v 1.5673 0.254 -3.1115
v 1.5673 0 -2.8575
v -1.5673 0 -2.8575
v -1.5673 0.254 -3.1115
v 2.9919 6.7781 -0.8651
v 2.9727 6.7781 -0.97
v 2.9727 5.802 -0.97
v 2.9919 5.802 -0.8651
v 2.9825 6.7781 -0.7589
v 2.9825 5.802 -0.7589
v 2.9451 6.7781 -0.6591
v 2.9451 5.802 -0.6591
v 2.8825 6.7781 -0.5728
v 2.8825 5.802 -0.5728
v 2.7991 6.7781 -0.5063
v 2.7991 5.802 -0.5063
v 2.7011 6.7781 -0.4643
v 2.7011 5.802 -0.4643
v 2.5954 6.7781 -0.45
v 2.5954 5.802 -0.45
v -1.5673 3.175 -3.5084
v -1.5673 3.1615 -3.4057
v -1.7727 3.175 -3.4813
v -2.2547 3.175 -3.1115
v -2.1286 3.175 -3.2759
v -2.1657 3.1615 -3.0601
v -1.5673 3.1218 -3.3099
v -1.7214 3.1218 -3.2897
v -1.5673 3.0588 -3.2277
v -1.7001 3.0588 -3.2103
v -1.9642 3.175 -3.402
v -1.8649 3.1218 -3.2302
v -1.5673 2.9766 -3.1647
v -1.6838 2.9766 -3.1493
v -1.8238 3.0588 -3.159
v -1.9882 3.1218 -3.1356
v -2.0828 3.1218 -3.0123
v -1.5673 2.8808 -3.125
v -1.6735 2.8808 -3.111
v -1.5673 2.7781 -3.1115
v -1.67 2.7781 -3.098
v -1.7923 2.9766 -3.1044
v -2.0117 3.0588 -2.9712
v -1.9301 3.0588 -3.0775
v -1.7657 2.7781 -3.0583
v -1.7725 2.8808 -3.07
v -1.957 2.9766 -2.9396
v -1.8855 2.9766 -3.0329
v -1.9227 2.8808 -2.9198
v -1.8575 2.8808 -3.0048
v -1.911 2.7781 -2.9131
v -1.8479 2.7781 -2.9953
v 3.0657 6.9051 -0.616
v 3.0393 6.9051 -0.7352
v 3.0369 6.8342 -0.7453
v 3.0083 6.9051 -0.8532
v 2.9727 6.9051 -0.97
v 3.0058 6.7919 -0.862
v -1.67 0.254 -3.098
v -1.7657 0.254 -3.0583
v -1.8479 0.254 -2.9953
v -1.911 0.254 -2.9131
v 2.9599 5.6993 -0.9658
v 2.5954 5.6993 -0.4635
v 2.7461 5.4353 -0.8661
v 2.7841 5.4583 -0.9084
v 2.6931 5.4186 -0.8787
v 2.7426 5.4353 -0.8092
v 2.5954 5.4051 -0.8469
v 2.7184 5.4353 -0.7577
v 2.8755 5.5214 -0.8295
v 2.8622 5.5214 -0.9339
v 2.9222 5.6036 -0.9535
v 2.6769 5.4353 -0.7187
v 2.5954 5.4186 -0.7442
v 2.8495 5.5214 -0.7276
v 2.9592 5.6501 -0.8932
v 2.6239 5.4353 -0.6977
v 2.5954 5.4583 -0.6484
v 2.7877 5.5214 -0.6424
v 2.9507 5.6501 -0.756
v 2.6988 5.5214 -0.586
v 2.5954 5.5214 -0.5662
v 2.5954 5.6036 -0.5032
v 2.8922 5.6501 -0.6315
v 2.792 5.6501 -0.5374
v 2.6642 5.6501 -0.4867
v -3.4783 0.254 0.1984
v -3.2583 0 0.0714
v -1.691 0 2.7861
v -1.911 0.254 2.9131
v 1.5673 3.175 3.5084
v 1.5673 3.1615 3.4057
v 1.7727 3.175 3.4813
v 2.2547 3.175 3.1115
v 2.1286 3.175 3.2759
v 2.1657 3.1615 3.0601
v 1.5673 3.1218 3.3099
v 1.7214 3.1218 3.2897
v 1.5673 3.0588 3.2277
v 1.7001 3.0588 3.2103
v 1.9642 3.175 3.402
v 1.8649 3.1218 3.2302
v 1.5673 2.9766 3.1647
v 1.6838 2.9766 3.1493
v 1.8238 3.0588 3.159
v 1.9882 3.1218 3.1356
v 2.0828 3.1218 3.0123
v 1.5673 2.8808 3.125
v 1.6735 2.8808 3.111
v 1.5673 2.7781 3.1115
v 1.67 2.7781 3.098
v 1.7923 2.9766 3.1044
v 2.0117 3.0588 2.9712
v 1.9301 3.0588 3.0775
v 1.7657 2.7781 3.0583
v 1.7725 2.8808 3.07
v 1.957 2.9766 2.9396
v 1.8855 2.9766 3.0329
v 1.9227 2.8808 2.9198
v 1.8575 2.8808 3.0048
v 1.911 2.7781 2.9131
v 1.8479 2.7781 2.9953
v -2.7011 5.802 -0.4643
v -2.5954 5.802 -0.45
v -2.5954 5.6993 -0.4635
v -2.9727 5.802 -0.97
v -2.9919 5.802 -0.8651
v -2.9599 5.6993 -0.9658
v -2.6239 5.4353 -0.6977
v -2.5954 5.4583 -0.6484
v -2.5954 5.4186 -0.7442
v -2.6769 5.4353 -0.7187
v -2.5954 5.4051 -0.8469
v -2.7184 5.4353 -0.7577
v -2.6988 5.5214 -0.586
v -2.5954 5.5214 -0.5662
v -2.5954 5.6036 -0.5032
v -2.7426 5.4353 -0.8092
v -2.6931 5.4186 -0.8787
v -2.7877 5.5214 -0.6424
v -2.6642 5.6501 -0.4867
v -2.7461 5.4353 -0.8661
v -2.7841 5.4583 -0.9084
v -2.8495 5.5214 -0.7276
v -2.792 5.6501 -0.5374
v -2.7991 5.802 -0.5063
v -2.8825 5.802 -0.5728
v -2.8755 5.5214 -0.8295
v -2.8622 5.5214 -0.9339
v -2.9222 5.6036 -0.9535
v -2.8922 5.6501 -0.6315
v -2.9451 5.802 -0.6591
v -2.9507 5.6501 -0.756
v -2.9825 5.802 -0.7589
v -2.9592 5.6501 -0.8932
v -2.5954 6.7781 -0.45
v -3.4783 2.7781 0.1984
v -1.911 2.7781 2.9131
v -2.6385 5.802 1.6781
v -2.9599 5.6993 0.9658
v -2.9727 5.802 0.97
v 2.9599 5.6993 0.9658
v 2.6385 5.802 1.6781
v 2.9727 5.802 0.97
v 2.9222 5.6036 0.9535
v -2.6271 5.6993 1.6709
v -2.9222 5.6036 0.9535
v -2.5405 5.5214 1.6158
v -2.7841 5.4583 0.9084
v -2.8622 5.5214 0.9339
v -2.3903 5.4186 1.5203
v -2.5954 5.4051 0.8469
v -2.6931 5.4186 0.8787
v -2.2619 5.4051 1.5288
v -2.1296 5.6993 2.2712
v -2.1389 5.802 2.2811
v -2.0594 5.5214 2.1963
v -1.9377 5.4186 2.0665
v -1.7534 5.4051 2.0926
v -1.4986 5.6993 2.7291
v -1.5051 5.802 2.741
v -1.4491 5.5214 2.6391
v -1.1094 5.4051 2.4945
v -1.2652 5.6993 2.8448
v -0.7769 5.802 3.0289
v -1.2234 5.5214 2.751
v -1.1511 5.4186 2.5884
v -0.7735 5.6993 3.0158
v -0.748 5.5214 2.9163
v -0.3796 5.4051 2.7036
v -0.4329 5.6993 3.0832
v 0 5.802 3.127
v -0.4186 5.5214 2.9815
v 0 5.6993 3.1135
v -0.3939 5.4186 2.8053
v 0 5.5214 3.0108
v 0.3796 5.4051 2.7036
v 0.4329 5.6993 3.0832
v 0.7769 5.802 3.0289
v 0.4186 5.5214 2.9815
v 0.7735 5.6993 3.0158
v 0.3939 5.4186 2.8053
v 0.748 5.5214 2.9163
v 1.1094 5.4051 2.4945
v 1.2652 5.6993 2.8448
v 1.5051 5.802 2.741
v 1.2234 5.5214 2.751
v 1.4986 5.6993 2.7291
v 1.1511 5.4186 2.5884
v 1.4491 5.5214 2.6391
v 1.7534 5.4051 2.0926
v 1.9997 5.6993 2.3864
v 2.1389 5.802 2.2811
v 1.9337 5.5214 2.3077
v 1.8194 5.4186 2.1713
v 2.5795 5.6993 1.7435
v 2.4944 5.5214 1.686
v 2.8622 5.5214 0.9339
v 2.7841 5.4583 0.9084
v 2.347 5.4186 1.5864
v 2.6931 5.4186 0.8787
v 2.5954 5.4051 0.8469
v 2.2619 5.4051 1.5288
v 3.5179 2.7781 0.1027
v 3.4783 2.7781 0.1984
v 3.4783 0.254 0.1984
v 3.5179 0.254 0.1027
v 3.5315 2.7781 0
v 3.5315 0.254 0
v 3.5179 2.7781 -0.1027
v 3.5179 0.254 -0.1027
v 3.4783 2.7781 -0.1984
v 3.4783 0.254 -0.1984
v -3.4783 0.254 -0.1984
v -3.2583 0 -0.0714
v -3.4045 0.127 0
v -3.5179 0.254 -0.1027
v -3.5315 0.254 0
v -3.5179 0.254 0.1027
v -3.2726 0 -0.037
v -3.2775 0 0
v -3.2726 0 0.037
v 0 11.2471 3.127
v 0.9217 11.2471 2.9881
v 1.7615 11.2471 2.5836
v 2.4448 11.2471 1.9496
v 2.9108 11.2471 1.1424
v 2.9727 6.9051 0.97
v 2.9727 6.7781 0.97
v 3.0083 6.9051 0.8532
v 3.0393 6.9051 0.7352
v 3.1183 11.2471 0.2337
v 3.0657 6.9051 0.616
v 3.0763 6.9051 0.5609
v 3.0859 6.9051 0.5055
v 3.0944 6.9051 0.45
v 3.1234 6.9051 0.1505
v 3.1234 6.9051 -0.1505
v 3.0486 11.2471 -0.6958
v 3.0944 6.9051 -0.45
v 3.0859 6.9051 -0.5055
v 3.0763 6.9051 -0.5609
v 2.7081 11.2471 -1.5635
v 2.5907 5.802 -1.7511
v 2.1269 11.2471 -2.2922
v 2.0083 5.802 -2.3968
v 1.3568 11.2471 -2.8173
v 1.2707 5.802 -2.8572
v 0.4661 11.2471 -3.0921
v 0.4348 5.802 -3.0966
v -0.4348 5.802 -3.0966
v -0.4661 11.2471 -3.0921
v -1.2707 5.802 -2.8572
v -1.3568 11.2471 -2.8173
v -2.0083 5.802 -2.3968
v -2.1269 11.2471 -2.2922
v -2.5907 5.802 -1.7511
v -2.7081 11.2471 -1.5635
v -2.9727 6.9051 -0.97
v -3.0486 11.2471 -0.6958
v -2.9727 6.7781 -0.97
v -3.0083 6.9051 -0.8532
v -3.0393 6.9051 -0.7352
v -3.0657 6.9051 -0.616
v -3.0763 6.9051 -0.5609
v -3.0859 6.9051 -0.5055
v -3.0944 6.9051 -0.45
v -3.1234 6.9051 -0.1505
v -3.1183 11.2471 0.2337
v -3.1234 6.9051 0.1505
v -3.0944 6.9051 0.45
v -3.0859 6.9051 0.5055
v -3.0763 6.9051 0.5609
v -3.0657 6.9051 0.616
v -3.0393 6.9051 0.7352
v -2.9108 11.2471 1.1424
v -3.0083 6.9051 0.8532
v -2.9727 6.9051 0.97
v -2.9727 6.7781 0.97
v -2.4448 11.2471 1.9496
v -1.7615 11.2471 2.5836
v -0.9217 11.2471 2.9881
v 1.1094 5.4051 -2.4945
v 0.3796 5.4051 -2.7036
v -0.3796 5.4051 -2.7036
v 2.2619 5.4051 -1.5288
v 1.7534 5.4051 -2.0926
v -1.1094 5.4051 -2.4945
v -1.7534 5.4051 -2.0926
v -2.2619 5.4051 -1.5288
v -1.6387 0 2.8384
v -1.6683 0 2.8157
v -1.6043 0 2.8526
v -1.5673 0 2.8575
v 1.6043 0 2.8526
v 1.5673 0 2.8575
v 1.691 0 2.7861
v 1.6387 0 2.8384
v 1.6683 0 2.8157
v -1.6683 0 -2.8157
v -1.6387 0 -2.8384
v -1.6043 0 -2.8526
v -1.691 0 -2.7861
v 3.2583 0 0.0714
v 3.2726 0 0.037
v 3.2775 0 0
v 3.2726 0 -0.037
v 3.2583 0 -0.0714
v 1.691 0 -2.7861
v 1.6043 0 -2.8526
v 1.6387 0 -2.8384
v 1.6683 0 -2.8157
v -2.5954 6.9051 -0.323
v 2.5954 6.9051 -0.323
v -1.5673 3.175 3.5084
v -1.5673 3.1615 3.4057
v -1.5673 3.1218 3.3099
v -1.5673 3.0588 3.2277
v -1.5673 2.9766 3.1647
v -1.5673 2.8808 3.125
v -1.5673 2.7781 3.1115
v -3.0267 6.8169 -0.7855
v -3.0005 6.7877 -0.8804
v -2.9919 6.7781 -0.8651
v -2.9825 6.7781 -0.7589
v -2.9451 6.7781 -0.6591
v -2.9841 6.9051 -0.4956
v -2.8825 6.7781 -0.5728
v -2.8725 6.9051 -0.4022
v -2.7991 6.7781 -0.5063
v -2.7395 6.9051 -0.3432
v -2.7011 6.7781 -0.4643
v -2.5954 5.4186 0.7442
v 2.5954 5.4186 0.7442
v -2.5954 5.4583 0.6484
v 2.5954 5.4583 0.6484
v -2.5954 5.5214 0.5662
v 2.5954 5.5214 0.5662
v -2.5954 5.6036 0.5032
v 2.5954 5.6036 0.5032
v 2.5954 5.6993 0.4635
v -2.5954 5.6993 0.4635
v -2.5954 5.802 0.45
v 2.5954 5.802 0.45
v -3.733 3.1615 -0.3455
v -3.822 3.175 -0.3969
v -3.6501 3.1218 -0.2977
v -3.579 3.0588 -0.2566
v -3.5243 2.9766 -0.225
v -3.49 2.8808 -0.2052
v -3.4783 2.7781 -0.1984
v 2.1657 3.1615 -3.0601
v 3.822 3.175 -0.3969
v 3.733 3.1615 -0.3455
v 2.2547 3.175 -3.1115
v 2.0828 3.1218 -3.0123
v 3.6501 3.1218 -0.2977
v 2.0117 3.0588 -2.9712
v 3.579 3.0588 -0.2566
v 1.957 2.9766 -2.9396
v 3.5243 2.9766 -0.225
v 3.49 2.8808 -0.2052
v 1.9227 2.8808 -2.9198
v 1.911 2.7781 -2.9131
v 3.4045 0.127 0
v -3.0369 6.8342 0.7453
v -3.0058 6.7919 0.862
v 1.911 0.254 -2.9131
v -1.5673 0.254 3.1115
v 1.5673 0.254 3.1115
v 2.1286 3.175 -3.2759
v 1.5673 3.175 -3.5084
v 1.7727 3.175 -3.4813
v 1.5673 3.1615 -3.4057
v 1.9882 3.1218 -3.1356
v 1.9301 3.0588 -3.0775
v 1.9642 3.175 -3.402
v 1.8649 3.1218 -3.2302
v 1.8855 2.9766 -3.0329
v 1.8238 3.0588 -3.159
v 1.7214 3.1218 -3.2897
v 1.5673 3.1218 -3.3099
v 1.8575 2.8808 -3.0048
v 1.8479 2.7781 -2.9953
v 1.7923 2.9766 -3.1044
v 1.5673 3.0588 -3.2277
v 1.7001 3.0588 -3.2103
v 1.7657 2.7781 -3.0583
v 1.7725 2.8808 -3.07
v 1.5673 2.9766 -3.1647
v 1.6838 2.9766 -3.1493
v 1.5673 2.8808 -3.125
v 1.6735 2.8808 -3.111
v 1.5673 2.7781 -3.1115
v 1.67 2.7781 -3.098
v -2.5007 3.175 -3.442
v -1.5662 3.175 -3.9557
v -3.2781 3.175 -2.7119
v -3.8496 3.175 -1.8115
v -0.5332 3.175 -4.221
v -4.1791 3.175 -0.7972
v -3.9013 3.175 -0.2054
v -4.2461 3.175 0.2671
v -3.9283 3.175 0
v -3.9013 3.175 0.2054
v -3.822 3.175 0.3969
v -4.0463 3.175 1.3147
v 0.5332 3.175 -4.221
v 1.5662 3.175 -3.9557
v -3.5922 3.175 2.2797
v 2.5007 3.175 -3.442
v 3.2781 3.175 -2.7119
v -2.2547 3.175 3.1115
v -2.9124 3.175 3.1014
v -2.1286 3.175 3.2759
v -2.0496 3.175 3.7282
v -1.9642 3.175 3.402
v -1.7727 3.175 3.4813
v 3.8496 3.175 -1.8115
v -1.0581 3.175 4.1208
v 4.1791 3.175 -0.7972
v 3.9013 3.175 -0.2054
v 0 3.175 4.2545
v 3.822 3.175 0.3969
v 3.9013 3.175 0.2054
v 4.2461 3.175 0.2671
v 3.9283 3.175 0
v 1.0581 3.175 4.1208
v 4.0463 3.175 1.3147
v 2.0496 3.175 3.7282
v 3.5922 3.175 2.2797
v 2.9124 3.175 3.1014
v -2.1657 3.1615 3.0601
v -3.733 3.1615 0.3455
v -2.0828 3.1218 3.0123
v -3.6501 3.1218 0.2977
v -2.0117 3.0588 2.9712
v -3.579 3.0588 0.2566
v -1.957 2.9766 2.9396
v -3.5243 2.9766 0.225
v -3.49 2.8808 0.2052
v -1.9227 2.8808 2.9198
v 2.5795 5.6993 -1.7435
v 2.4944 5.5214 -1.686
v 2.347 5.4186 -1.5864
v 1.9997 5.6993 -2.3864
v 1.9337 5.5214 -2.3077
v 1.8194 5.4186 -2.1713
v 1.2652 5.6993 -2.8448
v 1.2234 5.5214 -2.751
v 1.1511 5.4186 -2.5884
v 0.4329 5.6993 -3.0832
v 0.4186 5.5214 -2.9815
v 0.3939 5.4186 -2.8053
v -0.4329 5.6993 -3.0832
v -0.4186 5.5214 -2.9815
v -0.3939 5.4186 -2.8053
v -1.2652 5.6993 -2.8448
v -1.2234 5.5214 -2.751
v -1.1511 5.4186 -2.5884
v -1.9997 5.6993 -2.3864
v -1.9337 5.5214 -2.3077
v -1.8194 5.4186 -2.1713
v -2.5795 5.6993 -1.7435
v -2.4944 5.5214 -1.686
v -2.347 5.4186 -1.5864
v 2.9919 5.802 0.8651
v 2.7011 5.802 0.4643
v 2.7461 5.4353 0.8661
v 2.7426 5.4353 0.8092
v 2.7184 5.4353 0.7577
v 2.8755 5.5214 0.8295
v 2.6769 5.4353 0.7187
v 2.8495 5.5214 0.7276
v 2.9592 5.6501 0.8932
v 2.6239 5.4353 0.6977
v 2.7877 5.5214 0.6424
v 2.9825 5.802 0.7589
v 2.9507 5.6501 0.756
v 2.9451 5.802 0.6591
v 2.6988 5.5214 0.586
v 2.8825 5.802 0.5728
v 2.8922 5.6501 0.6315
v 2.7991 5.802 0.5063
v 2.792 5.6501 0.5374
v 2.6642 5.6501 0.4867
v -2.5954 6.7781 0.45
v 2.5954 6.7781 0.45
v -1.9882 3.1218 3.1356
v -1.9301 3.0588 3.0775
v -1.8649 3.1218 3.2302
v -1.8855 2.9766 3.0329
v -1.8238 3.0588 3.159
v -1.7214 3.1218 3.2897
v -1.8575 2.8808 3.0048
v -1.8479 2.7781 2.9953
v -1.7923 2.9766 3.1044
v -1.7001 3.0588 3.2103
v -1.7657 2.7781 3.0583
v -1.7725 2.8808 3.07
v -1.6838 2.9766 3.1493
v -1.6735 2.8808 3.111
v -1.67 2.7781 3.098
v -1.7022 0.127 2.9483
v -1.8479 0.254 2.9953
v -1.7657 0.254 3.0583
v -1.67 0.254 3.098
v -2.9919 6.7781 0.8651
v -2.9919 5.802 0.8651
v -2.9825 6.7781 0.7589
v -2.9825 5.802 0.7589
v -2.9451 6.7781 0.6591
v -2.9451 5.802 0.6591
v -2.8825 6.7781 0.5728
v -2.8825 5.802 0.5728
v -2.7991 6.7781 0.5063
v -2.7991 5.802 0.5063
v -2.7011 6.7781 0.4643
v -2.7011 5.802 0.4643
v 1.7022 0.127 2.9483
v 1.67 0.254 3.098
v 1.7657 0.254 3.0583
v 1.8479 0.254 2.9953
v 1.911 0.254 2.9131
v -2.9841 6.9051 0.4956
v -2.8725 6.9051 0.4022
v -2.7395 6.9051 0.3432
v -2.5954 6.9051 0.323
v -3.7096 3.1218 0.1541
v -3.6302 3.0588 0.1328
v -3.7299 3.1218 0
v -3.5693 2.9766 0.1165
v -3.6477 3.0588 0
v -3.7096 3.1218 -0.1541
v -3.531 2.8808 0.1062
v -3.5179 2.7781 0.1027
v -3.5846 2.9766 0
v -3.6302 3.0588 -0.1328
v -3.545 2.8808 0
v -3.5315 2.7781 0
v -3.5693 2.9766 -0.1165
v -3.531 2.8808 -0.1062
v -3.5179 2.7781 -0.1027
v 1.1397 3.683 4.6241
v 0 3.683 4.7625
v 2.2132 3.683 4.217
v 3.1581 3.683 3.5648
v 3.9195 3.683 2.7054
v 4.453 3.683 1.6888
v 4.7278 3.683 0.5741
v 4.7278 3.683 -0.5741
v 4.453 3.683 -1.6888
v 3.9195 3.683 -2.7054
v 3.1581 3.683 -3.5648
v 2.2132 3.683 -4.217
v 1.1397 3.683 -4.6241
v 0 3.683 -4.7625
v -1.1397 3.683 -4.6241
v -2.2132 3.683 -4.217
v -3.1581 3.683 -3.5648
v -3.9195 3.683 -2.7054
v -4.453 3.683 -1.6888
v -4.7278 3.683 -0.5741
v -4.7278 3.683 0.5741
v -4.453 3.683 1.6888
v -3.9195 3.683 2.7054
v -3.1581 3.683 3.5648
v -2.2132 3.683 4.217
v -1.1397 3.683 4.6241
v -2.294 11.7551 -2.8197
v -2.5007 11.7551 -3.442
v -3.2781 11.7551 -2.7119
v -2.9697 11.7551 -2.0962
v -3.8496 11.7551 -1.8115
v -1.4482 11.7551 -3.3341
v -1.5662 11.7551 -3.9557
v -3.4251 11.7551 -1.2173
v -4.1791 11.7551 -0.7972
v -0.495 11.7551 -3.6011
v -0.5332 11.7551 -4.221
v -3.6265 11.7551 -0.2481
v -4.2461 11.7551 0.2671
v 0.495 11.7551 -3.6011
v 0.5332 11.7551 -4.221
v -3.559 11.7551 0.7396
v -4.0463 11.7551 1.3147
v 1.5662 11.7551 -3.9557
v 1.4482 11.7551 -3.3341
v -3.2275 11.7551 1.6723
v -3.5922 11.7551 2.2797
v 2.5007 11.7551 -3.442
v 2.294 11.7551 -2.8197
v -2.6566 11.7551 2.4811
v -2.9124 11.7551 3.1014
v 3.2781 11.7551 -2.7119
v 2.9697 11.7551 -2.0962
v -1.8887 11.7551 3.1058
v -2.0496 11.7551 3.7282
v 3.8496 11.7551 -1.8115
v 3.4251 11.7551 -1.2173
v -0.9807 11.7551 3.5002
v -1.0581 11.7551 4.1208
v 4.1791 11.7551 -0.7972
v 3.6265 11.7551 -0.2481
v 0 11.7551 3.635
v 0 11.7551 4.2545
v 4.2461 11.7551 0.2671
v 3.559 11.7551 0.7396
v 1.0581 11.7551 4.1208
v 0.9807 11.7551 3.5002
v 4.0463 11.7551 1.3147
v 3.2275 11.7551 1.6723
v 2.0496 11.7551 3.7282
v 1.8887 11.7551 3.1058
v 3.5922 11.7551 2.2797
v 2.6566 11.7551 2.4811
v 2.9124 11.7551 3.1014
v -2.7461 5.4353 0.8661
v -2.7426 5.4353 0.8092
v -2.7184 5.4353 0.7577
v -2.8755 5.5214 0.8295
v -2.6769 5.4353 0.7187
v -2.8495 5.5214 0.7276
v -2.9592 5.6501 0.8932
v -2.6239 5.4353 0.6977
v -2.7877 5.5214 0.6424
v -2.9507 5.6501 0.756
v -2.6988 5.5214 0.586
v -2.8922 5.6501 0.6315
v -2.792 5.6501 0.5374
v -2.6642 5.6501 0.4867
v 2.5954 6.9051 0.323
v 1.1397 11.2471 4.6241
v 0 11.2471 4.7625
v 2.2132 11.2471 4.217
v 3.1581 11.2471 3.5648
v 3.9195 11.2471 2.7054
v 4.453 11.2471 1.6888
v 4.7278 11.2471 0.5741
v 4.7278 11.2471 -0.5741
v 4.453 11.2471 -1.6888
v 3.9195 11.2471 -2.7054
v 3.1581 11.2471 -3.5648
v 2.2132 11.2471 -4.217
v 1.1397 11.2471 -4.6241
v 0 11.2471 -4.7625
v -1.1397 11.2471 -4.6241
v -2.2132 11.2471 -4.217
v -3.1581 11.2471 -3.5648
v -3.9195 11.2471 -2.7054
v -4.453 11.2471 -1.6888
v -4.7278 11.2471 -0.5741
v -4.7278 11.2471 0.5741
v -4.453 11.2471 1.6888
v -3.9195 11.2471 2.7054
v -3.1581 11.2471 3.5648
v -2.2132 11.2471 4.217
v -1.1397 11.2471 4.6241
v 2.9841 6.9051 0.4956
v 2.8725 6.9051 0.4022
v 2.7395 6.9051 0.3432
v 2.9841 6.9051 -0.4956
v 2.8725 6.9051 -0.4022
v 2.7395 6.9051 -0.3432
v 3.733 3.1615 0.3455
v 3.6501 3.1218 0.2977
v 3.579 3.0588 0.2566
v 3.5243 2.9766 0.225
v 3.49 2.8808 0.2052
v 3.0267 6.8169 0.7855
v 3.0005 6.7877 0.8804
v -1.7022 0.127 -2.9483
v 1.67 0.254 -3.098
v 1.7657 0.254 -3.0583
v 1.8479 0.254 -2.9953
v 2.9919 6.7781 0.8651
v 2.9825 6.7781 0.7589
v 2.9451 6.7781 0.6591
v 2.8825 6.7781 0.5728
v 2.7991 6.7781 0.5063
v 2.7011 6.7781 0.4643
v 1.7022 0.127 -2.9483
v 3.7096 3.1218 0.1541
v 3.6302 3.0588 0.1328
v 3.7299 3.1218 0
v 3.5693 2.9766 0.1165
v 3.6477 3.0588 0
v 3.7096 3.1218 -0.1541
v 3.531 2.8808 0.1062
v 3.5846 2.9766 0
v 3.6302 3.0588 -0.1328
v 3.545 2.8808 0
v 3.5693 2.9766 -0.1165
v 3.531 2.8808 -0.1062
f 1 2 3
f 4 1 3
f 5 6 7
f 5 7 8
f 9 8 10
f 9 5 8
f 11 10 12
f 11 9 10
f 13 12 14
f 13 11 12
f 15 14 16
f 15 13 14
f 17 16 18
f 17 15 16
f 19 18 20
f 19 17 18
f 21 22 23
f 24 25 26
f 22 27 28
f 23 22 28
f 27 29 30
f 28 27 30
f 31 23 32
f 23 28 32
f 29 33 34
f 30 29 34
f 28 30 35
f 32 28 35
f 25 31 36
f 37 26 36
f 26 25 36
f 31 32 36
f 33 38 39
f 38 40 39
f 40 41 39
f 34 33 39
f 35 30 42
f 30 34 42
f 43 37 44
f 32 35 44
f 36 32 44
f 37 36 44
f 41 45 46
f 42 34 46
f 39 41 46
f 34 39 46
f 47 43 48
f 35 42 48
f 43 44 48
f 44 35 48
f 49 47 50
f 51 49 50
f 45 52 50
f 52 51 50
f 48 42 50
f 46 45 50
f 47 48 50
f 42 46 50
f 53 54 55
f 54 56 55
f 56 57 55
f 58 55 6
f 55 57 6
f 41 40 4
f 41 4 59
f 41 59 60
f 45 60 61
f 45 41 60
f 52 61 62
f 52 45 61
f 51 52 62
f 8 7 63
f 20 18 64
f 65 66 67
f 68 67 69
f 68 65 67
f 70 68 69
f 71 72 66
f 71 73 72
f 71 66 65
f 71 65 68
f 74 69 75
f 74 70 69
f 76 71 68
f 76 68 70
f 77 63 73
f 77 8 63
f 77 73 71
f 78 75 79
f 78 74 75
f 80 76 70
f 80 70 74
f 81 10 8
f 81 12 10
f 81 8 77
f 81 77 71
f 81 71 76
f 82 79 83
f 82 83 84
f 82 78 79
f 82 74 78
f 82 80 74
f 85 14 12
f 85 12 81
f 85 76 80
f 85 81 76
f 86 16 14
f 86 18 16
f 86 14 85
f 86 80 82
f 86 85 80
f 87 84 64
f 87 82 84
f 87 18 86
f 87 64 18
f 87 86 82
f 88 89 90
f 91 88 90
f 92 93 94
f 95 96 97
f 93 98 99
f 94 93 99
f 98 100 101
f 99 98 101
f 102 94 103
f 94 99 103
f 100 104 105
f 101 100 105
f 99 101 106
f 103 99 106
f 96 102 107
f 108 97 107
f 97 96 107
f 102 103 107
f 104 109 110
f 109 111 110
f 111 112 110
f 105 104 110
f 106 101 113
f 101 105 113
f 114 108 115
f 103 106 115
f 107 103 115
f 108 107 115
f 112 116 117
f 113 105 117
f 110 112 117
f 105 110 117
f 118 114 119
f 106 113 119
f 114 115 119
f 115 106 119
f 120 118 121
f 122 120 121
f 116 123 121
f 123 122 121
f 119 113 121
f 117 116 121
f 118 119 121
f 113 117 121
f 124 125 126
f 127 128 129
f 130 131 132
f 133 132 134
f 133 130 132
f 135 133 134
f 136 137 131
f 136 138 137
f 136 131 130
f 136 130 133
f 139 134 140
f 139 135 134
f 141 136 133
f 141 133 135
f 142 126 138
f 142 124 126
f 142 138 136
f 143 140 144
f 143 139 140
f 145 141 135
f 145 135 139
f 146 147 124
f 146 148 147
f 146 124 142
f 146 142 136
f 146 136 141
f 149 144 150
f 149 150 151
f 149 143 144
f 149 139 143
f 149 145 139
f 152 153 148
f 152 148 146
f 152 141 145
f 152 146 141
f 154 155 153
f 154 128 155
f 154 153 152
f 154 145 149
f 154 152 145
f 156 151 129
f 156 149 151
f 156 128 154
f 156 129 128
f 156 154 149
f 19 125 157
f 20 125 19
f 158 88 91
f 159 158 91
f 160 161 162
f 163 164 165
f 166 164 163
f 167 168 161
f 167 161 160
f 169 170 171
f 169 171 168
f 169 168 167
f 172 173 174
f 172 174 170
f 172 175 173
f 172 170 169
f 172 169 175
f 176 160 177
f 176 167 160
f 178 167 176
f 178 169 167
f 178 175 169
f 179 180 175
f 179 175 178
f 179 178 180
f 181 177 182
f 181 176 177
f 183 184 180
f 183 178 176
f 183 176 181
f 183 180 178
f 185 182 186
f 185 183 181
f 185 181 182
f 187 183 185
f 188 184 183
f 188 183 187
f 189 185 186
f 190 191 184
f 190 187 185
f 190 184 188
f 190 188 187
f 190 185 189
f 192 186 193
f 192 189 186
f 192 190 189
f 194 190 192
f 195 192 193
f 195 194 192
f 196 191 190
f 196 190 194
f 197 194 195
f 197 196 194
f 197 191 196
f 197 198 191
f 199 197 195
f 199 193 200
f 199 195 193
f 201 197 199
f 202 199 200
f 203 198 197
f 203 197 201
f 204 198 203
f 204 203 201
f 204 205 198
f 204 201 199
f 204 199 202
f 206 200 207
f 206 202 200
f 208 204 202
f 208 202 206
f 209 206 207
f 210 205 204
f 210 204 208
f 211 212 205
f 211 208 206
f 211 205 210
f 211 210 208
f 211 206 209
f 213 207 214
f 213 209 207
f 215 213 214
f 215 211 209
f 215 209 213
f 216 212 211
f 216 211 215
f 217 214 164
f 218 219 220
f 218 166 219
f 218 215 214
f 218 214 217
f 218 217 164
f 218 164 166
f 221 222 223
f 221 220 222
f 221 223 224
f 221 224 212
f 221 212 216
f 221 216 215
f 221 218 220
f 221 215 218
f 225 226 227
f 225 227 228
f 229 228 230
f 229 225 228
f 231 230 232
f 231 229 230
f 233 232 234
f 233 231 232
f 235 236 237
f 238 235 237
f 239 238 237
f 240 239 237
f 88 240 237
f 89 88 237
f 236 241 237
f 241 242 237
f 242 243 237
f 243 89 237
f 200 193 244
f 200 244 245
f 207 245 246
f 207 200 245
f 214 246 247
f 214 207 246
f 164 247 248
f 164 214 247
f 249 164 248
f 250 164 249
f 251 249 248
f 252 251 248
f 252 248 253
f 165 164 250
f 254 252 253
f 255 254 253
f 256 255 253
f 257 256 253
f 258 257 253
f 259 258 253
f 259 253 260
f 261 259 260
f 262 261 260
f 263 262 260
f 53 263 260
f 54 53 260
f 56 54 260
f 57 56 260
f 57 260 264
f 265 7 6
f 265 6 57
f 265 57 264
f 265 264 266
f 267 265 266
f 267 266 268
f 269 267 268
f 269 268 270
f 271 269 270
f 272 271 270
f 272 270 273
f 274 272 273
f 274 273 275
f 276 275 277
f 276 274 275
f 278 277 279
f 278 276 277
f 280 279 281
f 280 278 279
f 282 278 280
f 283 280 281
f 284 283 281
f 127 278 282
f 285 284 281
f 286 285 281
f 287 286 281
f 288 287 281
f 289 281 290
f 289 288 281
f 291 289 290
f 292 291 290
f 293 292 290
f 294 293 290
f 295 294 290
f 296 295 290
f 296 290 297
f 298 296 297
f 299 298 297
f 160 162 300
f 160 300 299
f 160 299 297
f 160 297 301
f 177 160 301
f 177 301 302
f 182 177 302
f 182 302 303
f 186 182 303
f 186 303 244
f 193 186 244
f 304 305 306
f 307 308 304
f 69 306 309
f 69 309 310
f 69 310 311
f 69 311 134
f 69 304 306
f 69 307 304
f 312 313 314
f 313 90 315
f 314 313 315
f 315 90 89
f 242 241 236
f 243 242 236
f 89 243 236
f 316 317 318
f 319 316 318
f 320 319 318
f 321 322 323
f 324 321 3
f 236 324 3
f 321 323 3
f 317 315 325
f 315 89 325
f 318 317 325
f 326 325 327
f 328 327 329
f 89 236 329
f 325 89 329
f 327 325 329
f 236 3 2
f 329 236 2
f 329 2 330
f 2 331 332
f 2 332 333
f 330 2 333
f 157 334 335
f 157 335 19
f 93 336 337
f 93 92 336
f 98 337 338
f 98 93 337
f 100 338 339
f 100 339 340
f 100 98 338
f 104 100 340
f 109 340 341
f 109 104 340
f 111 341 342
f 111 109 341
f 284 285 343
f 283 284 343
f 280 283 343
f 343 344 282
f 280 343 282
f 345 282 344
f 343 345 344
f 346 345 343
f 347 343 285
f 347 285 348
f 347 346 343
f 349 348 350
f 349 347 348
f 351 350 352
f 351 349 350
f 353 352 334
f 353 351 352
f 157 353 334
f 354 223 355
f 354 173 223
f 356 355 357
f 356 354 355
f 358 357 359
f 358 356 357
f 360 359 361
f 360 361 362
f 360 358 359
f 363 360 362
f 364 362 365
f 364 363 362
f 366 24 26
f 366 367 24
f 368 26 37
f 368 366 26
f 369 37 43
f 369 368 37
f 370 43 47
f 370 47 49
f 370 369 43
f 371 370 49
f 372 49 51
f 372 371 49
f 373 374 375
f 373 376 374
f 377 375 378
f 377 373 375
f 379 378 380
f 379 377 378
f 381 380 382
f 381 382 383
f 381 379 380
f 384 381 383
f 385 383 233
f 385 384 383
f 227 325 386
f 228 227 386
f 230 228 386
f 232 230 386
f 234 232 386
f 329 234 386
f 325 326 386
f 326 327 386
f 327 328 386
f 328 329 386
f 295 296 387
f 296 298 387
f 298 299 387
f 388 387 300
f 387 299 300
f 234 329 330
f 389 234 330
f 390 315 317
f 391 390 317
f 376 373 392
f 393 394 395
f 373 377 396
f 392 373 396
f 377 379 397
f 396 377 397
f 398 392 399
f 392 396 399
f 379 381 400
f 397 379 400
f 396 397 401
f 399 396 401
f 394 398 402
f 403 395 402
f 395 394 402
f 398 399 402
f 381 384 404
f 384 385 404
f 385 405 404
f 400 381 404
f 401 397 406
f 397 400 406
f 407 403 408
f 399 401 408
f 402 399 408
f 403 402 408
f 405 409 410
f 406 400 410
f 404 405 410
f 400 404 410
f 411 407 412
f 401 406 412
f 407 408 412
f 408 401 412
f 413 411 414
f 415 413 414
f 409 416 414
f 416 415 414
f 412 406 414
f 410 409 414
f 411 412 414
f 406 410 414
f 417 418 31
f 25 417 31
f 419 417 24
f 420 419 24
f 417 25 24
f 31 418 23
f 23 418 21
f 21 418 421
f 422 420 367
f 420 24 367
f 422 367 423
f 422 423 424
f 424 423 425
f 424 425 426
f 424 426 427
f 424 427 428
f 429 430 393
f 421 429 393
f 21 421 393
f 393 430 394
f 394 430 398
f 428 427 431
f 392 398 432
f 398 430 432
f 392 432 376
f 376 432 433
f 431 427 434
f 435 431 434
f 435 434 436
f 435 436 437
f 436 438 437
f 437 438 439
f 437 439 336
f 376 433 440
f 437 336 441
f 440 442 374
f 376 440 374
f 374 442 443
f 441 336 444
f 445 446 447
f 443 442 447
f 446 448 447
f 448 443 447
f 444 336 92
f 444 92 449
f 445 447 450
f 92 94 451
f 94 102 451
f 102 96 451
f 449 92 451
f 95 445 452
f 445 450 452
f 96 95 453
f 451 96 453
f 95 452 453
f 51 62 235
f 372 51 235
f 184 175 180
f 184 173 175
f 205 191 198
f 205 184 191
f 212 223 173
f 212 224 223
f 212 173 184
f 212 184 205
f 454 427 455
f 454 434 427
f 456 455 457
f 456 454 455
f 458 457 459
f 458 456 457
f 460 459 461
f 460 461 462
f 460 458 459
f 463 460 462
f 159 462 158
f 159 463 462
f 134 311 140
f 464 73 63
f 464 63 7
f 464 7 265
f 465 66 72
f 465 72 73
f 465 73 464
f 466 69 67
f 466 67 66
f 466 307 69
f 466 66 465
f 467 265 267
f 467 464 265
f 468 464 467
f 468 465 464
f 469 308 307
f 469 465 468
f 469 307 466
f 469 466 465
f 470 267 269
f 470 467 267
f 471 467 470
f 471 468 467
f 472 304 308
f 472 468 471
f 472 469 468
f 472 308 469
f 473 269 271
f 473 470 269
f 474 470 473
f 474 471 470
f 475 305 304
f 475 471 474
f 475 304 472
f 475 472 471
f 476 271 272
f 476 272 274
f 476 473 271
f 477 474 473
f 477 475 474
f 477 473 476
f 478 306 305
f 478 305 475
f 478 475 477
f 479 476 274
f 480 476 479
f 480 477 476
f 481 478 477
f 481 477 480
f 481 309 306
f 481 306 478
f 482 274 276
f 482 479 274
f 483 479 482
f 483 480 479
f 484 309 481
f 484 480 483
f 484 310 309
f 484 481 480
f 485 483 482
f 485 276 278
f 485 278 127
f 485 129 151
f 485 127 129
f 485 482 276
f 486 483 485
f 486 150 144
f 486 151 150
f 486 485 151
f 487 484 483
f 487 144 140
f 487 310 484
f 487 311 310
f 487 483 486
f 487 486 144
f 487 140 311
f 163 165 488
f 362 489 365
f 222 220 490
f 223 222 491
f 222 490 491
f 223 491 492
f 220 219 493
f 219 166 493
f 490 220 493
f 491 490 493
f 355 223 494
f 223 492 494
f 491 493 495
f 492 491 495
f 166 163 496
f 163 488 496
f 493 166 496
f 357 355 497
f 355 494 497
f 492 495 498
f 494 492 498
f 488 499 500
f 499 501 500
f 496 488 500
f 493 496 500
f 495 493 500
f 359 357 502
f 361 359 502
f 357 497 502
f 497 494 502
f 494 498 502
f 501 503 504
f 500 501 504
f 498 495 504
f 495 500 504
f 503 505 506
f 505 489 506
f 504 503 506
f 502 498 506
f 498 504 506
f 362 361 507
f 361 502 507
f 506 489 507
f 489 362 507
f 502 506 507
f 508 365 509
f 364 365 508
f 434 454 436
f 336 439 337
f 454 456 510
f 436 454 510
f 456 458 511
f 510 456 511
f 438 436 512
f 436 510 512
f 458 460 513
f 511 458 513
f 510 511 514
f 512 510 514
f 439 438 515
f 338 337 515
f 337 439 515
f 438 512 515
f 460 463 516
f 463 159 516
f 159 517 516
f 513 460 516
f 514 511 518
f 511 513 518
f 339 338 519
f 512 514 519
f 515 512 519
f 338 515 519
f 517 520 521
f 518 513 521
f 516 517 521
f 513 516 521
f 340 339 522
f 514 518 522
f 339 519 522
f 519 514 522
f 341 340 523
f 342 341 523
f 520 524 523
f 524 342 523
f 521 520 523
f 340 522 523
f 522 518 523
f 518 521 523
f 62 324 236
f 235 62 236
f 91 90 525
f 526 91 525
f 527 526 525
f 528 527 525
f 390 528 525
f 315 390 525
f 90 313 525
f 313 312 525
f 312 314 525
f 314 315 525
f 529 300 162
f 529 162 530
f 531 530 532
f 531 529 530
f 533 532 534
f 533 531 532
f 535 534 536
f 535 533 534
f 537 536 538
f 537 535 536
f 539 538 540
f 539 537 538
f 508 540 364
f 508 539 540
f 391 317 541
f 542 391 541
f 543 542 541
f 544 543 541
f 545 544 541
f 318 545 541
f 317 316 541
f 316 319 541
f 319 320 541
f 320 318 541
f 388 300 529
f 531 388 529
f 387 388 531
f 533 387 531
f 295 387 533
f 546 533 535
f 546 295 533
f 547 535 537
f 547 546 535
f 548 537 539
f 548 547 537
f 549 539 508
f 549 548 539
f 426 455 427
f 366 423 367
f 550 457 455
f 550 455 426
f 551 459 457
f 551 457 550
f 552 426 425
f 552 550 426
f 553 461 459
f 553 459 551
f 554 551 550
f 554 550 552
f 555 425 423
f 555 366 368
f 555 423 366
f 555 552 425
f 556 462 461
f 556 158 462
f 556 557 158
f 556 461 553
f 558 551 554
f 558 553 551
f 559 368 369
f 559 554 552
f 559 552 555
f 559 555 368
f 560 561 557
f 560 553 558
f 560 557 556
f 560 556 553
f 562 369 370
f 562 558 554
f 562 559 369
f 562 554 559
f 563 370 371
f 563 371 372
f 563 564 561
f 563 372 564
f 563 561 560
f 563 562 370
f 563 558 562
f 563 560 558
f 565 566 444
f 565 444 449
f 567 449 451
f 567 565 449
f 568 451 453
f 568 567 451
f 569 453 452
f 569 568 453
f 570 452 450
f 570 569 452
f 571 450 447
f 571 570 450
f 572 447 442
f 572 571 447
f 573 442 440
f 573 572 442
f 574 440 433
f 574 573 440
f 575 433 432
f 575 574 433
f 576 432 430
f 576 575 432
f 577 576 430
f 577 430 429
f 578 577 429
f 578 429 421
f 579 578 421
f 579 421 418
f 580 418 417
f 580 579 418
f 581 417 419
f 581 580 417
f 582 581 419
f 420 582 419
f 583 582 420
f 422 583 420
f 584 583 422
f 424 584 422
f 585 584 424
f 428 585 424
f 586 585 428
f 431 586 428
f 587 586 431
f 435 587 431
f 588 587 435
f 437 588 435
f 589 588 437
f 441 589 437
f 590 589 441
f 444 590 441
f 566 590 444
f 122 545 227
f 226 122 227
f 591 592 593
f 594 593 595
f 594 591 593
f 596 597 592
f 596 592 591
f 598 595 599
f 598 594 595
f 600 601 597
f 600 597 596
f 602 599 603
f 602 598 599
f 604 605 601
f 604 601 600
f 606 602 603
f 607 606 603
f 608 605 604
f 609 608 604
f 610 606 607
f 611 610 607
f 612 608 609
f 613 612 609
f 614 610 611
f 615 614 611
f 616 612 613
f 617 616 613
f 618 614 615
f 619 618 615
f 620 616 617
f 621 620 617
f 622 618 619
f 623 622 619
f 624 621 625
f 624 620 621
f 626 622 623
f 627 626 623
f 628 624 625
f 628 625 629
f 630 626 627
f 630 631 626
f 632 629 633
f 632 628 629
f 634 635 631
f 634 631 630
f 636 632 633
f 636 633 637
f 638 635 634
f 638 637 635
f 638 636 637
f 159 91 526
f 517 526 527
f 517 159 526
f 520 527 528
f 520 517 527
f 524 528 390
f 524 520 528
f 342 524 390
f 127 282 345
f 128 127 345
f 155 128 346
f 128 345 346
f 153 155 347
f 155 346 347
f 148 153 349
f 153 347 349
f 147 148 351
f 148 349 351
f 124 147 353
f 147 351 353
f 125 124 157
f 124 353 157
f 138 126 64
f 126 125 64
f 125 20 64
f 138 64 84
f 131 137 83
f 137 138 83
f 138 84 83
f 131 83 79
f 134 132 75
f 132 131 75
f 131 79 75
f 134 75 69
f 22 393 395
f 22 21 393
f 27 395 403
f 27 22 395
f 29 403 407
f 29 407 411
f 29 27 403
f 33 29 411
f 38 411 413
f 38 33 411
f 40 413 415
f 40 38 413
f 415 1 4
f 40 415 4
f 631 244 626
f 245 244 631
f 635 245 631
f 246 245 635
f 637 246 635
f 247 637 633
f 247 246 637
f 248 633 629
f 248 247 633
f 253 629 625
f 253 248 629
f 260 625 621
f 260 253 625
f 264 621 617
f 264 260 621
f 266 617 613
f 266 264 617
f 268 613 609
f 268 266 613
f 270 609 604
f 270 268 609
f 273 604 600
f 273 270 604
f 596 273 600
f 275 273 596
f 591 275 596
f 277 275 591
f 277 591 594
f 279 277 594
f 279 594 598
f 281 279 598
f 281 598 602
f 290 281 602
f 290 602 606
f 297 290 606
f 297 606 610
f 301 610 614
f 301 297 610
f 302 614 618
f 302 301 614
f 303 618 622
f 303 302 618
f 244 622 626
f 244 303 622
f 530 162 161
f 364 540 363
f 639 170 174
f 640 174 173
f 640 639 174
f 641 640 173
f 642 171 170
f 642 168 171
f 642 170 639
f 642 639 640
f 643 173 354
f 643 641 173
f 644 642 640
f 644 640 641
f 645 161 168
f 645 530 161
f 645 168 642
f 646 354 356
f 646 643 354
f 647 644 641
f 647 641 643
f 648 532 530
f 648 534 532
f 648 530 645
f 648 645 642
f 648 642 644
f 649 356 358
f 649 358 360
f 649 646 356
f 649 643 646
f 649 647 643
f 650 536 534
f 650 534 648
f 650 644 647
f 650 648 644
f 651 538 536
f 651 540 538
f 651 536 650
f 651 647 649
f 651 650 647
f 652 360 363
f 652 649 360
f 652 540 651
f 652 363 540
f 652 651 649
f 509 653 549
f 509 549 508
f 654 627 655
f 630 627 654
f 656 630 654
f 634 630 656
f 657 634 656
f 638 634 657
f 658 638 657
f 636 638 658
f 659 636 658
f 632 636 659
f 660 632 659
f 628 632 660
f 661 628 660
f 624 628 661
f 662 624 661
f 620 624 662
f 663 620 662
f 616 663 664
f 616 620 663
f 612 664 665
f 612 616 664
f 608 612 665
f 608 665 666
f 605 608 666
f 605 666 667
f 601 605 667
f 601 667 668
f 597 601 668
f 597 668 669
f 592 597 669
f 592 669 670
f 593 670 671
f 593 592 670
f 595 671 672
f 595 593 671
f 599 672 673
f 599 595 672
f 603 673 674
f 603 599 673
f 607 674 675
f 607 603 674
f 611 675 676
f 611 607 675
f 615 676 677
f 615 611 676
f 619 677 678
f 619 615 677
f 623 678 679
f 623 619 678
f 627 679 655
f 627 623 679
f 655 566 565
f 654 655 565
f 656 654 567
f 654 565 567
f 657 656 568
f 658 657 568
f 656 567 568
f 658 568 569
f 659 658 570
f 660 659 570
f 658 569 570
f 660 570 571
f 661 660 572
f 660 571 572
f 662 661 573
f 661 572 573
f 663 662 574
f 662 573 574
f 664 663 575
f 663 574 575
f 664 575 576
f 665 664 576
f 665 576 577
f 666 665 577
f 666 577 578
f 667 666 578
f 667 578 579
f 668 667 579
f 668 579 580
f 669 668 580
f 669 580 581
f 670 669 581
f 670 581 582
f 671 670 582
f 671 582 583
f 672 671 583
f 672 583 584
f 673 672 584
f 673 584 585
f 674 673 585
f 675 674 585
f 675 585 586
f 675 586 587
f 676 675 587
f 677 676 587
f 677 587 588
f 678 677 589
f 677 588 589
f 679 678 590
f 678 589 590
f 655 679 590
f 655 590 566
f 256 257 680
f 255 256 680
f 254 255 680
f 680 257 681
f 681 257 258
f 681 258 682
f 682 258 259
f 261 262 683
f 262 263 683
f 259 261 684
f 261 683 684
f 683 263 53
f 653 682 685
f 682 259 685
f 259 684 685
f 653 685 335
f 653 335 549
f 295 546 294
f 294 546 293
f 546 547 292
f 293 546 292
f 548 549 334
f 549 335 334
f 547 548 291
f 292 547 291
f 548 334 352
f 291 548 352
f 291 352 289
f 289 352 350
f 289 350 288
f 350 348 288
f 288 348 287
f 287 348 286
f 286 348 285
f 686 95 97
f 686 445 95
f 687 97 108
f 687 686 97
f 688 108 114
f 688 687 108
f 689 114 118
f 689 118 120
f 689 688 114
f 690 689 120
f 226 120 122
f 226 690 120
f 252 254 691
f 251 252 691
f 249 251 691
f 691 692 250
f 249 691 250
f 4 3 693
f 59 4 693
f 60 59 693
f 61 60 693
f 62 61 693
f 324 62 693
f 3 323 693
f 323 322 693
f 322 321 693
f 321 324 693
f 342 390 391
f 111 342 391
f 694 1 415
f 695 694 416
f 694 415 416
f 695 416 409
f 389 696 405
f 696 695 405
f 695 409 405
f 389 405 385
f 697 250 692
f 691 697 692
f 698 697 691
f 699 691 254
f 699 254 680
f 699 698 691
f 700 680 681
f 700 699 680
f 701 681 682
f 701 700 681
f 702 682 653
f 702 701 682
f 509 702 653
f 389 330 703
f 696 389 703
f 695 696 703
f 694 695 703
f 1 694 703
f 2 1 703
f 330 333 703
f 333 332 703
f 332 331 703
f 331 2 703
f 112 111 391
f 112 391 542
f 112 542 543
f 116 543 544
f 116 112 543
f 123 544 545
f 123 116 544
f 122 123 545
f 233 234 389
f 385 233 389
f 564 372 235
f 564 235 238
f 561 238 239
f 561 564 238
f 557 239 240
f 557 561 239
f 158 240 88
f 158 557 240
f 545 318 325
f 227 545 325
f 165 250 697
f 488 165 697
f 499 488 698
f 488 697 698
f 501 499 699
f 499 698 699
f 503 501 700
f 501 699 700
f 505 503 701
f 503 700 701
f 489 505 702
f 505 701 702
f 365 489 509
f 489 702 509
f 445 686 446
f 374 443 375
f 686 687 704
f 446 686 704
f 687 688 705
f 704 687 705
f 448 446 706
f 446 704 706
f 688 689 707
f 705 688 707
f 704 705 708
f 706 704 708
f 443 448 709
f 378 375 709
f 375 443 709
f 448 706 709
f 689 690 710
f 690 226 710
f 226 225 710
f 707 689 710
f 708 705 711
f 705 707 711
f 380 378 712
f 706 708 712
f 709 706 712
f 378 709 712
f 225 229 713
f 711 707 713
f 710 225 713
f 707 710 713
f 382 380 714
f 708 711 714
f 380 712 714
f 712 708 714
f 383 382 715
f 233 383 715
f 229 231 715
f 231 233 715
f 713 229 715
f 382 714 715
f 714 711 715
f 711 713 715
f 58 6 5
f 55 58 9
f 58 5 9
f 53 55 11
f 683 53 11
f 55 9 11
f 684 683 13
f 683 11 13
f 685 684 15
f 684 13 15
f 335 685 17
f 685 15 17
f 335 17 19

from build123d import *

# Parameters (mm, degrees)
BOSS_EXTRUDE1_DEPTH = 3.175
SKETCH2_R           = 4.7625
BOSS_EXTRUDE2_DEPTH = 2.23012
SKETCH3_R           = 4.7625
SKETCH3_R_2         = 3.126994
BOSS_EXTRUDE3_DEPTH = 6.35
BOSS_EXTRUDE4_DEPTH = 1.5
FILLET1_1_64_R      = 0.396875
CHAMFER1_0_02_SIZE  = 0.508
CHAMFER2_0_005_SIZE = 0.127
CHAMFER3_0_01_SIZE  = 0.254


with BuildPart() as part:
    # Sketch1 → Boss-Extrude1 (new body)
    with BuildSketch(Plane(origin=(0, 0, 0), x_dir=(1, 0, 0), z_dir=(0, 1, 0))):
        Polygon((1.796425363, 3.1115), (-1.796425363, 3.1115), (-3.592850725, 0), (-1.796425363, -3.1115), (1.796425363, -3.1115), (3.592850725, 0), align=None)
    extrude(amount=BOSS_EXTRUDE1_DEPTH)

    # Sketch2 → Boss-Extrude2 (add)
    with BuildSketch(Plane(origin=(0, 3.175, 0), x_dir=(1, 0, 0), z_dir=(0, 1, 0))):
        with Locations(Location((0, 0, 0), (0, 0, 270))):
            Circle(SKETCH2_R)
    extrude(amount=BOSS_EXTRUDE2_DEPTH)

    # Sketch3 → Boss-Extrude3 (add)
    with BuildSketch(Plane(origin=(0, 5.40512, 0), x_dir=(1, 0, 0), z_dir=(0, 1, 0))):
        with Locations(Location((0, 0, 0), (0, 0, 270))):
            Circle(SKETCH3_R)
        with Locations(Location((0, 0, 0), (0, 0, 270))):
            Circle(SKETCH3_R_2, mode=Mode.SUBTRACT)
    extrude(amount=BOSS_EXTRUDE3_DEPTH)

    # Sketch4 → Boss-Extrude4 (add)
    with BuildSketch(Plane(origin=(0, 5.40512, 0), x_dir=(1, 0, 0), z_dir=(0, 1, 0))):
        with BuildLine():
            Line((-3.094445261, 0.45), (3.094445261, 0.45))
            ThreePointArc((3.094445261, 0.45), (3.126994, 0), (3.094445261, -0.45))
            Line((3.094445261, -0.45), (-3.094445261, -0.45))
            ThreePointArc((-3.094445261, -0.45), (-3.126994, 0), (-3.094445261, 0.45))
        make_face()
    extrude(amount=BOSS_EXTRUDE4_DEPTH)

    # Fillet1-1/64
    fillet1_1_64_edges = [part.edges().sort_by_distance(p)[0] for p in [
        (-2.694638044, 3.175, -1.55575),
        (3.592850725, 1.5875, 0),
        (1.796425363, 1.5875, 3.1115),
        (-1.796425363, 1.5875, 3.1115),
        (-3.592850725, 1.5875, 0),
        (-1.796425363, 1.5875, -3.1115),
        (1.796425363, 1.5875, -3.1115),
        (-2.694638044, 3.175, 1.55575),
        (0, 3.175, 3.1115),
        (2.694638044, 3.175, 1.55575),
        (0, 5.40512, -3.126994),
        (-2.045842635, 5.40512, 2.36487196),
        (-3.094445261, 6.15512, -0.45),
        (0, 5.40512, 0.45),
        (-3.094445261, 6.15512, 0.45),
        (3.094445261, 6.15512, 0.45),
        (0, 5.40512, -0.45),
        (3.094445261, 6.15512, -0.45),
        (2.694638044, 3.175, -1.55575),
        (0, 3.175, -3.1115),
    ]]
    fillet(fillet1_1_64_edges, radius=FILLET1_1_64_R)

    # Chamfer1-0.02
    chamfer1_0_02_edges = [part.edges().sort_by_distance(p)[0] for p in [
        (0, 3.175, -4.7625),
        (0, 11.75512, -4.7625),
        (0, 11.75512, -3.126994),
    ]]
    chamfer(chamfer1_0_02_edges, length=CHAMFER1_0_02_SIZE)

    # Chamfer2-0.005
    # the kernel refuses this chamfer: 0.127 mm, written as the material it takes off along each edge
    with BuildSketch(Plane(origin=(-2.595448418, 6.90512, -0.45), x_dir=(0, 0.027495876610587285, 0.9996219169112968), z_dir=(1, 0, 0)), Plane(origin=(2.595448418, 6.90512, 0.45), x_dir=(0, 0.027495876610587285, -0.9996219169112968), z_dir=(-1, 0, 0))) as chamfer2_0_005_piece_1:
        Polygon((CHAMFER2_0_005_SIZE * 0.999621916911, CHAMFER2_0_005_SIZE * 0.0274958766106), (-CHAMFER2_0_005_SIZE * 0.0274958766106, CHAMFER2_0_005_SIZE * 0.999621916911), (0, 0), align=None)
    extrude(amount=5.190896835, mode=Mode.SUBTRACT)
    with BuildSketch(Plane(origin=(-2.595448418, 6.90512, -0.846875), x_dir=(-0.4186703663111546, 0, -0.9081382738178606), z_dir=(0.9081382738178606, 0, -0.4186703663111546))) as chamfer2_0_005_piece_2_section:
        Polygon((0.396875 + CHAMFER2_0_005_SIZE, 0), (0.396875, -CHAMFER2_0_005_SIZE), (0.396875, 0), align=None)
    chamfer2_0_005_piece_2 = revolve(axis=Axis((-2.595448418, 6.90512, -0.846875), (0, 1, 0)), revolution_arc=155.249329417, mode=Mode.PRIVATE)
    chamfer2_0_005_piece_2 = chamfer2_0_005_piece_2 & Plane(origin=(0, 6.859082355, 0), x_dir=(0, 0, 1), z_dir=(0, -1, 0)) * Cylinder(3.126994, 3, mode=Mode.PRIVATE)
    add(chamfer2_0_005_piece_2, mode=Mode.SUBTRACT)
    with BuildSketch(Plane(origin=(-2.595448418, 6.90512, 0.846875), x_dir=(-0.41867036631116117, 0, 0.9081382738178575), z_dir=(0.9081382738178575, 0, 0.41867036631116117))) as chamfer2_0_005_piece_3_section:
        Polygon((0.396875, CHAMFER2_0_005_SIZE), (0.396875 + CHAMFER2_0_005_SIZE, 0), (0.396875, 0), align=None)
    chamfer2_0_005_piece_3 = revolve(axis=Axis((-2.595448418, 6.90512, 0.846875), (0, -1, 0)), revolution_arc=155.249329417, mode=Mode.PRIVATE)
    chamfer2_0_005_piece_3 = chamfer2_0_005_piece_3 & Plane(origin=(0, 6.859082356, 0), x_dir=(0, 0, 1), z_dir=(0, -1, 0)) * Cylinder(3.126994, 3, mode=Mode.PRIVATE)
    add(chamfer2_0_005_piece_3, mode=Mode.SUBTRACT)
    with BuildSketch(Plane(origin=(2.595448418, 6.90512, -0.846875), x_dir=(0.41867036631115895, 0, -0.9081382738178586), z_dir=(-0.9081382738178586, 0, -0.41867036631115895))) as chamfer2_0_005_piece_4_section:
        Polygon((0.396875 + CHAMFER2_0_005_SIZE, 0), (0.396875, CHAMFER2_0_005_SIZE), (0.396875, 0), align=None)
    chamfer2_0_005_piece_4 = revolve(axis=Axis((2.595448418, 6.90512, -0.846875), (0, -1, 0)), revolution_arc=155.249329417, mode=Mode.PRIVATE)
    chamfer2_0_005_piece_4 = chamfer2_0_005_piece_4 & Plane(origin=(0, 6.859082492, 0), x_dir=(0, 0, 1), z_dir=(0, -1, 0)) * Cylinder(3.126994, 3, mode=Mode.PRIVATE)
    add(chamfer2_0_005_piece_4, mode=Mode.SUBTRACT)
    with BuildSketch(Plane(origin=(2.595448418, 6.90512, 0.846875), x_dir=(0.41867036631115895, 0, 0.9081382738178586), z_dir=(-0.9081382738178586, 0, 0.41867036631115895))) as chamfer2_0_005_piece_5_section:
        Polygon((0.396875 + CHAMFER2_0_005_SIZE, 0), (0.396875, -CHAMFER2_0_005_SIZE), (0.396875, 0), align=None)
    chamfer2_0_005_piece_5 = revolve(axis=Axis((2.595448418, 6.90512, 0.846875), (0, 1, 0)), revolution_arc=155.249329417, mode=Mode.PRIVATE)
    chamfer2_0_005_piece_5 = chamfer2_0_005_piece_5 & Plane(origin=(0, 6.859082356, 0), x_dir=(0, 0, 1), z_dir=(0, -1, 0)) * Cylinder(3.126994, 3, mode=Mode.PRIVATE)
    add(chamfer2_0_005_piece_5, mode=Mode.SUBTRACT)

    # Chamfer3-0.01
    chamfer3_0_01_edges = [part.edges().sort_by_distance(p)[0] for p in [
        (2.694638044, 0, 1.55575),
        (2.694638044, 0, -1.55575),
        (0, 0, 3.1115),
        (-2.694638044, 0, 1.55575),
        (-2.694638044, 0, -1.55575),
        (0, 0, -3.1115),
        (1.765726974, 0, -3.058328832),
        (3.531453949, 0, 0),
        (-1.765726974, 0, -3.058328832),
        (-3.531453949, 0, 0),
        (-1.765726974, 0, 3.058328832),
        (1.765726974, 0, 3.058328832),
    ]]
    chamfer(chamfer3_0_01_edges, length=CHAMFER3_0_01_SIZE)


solid = part.part
